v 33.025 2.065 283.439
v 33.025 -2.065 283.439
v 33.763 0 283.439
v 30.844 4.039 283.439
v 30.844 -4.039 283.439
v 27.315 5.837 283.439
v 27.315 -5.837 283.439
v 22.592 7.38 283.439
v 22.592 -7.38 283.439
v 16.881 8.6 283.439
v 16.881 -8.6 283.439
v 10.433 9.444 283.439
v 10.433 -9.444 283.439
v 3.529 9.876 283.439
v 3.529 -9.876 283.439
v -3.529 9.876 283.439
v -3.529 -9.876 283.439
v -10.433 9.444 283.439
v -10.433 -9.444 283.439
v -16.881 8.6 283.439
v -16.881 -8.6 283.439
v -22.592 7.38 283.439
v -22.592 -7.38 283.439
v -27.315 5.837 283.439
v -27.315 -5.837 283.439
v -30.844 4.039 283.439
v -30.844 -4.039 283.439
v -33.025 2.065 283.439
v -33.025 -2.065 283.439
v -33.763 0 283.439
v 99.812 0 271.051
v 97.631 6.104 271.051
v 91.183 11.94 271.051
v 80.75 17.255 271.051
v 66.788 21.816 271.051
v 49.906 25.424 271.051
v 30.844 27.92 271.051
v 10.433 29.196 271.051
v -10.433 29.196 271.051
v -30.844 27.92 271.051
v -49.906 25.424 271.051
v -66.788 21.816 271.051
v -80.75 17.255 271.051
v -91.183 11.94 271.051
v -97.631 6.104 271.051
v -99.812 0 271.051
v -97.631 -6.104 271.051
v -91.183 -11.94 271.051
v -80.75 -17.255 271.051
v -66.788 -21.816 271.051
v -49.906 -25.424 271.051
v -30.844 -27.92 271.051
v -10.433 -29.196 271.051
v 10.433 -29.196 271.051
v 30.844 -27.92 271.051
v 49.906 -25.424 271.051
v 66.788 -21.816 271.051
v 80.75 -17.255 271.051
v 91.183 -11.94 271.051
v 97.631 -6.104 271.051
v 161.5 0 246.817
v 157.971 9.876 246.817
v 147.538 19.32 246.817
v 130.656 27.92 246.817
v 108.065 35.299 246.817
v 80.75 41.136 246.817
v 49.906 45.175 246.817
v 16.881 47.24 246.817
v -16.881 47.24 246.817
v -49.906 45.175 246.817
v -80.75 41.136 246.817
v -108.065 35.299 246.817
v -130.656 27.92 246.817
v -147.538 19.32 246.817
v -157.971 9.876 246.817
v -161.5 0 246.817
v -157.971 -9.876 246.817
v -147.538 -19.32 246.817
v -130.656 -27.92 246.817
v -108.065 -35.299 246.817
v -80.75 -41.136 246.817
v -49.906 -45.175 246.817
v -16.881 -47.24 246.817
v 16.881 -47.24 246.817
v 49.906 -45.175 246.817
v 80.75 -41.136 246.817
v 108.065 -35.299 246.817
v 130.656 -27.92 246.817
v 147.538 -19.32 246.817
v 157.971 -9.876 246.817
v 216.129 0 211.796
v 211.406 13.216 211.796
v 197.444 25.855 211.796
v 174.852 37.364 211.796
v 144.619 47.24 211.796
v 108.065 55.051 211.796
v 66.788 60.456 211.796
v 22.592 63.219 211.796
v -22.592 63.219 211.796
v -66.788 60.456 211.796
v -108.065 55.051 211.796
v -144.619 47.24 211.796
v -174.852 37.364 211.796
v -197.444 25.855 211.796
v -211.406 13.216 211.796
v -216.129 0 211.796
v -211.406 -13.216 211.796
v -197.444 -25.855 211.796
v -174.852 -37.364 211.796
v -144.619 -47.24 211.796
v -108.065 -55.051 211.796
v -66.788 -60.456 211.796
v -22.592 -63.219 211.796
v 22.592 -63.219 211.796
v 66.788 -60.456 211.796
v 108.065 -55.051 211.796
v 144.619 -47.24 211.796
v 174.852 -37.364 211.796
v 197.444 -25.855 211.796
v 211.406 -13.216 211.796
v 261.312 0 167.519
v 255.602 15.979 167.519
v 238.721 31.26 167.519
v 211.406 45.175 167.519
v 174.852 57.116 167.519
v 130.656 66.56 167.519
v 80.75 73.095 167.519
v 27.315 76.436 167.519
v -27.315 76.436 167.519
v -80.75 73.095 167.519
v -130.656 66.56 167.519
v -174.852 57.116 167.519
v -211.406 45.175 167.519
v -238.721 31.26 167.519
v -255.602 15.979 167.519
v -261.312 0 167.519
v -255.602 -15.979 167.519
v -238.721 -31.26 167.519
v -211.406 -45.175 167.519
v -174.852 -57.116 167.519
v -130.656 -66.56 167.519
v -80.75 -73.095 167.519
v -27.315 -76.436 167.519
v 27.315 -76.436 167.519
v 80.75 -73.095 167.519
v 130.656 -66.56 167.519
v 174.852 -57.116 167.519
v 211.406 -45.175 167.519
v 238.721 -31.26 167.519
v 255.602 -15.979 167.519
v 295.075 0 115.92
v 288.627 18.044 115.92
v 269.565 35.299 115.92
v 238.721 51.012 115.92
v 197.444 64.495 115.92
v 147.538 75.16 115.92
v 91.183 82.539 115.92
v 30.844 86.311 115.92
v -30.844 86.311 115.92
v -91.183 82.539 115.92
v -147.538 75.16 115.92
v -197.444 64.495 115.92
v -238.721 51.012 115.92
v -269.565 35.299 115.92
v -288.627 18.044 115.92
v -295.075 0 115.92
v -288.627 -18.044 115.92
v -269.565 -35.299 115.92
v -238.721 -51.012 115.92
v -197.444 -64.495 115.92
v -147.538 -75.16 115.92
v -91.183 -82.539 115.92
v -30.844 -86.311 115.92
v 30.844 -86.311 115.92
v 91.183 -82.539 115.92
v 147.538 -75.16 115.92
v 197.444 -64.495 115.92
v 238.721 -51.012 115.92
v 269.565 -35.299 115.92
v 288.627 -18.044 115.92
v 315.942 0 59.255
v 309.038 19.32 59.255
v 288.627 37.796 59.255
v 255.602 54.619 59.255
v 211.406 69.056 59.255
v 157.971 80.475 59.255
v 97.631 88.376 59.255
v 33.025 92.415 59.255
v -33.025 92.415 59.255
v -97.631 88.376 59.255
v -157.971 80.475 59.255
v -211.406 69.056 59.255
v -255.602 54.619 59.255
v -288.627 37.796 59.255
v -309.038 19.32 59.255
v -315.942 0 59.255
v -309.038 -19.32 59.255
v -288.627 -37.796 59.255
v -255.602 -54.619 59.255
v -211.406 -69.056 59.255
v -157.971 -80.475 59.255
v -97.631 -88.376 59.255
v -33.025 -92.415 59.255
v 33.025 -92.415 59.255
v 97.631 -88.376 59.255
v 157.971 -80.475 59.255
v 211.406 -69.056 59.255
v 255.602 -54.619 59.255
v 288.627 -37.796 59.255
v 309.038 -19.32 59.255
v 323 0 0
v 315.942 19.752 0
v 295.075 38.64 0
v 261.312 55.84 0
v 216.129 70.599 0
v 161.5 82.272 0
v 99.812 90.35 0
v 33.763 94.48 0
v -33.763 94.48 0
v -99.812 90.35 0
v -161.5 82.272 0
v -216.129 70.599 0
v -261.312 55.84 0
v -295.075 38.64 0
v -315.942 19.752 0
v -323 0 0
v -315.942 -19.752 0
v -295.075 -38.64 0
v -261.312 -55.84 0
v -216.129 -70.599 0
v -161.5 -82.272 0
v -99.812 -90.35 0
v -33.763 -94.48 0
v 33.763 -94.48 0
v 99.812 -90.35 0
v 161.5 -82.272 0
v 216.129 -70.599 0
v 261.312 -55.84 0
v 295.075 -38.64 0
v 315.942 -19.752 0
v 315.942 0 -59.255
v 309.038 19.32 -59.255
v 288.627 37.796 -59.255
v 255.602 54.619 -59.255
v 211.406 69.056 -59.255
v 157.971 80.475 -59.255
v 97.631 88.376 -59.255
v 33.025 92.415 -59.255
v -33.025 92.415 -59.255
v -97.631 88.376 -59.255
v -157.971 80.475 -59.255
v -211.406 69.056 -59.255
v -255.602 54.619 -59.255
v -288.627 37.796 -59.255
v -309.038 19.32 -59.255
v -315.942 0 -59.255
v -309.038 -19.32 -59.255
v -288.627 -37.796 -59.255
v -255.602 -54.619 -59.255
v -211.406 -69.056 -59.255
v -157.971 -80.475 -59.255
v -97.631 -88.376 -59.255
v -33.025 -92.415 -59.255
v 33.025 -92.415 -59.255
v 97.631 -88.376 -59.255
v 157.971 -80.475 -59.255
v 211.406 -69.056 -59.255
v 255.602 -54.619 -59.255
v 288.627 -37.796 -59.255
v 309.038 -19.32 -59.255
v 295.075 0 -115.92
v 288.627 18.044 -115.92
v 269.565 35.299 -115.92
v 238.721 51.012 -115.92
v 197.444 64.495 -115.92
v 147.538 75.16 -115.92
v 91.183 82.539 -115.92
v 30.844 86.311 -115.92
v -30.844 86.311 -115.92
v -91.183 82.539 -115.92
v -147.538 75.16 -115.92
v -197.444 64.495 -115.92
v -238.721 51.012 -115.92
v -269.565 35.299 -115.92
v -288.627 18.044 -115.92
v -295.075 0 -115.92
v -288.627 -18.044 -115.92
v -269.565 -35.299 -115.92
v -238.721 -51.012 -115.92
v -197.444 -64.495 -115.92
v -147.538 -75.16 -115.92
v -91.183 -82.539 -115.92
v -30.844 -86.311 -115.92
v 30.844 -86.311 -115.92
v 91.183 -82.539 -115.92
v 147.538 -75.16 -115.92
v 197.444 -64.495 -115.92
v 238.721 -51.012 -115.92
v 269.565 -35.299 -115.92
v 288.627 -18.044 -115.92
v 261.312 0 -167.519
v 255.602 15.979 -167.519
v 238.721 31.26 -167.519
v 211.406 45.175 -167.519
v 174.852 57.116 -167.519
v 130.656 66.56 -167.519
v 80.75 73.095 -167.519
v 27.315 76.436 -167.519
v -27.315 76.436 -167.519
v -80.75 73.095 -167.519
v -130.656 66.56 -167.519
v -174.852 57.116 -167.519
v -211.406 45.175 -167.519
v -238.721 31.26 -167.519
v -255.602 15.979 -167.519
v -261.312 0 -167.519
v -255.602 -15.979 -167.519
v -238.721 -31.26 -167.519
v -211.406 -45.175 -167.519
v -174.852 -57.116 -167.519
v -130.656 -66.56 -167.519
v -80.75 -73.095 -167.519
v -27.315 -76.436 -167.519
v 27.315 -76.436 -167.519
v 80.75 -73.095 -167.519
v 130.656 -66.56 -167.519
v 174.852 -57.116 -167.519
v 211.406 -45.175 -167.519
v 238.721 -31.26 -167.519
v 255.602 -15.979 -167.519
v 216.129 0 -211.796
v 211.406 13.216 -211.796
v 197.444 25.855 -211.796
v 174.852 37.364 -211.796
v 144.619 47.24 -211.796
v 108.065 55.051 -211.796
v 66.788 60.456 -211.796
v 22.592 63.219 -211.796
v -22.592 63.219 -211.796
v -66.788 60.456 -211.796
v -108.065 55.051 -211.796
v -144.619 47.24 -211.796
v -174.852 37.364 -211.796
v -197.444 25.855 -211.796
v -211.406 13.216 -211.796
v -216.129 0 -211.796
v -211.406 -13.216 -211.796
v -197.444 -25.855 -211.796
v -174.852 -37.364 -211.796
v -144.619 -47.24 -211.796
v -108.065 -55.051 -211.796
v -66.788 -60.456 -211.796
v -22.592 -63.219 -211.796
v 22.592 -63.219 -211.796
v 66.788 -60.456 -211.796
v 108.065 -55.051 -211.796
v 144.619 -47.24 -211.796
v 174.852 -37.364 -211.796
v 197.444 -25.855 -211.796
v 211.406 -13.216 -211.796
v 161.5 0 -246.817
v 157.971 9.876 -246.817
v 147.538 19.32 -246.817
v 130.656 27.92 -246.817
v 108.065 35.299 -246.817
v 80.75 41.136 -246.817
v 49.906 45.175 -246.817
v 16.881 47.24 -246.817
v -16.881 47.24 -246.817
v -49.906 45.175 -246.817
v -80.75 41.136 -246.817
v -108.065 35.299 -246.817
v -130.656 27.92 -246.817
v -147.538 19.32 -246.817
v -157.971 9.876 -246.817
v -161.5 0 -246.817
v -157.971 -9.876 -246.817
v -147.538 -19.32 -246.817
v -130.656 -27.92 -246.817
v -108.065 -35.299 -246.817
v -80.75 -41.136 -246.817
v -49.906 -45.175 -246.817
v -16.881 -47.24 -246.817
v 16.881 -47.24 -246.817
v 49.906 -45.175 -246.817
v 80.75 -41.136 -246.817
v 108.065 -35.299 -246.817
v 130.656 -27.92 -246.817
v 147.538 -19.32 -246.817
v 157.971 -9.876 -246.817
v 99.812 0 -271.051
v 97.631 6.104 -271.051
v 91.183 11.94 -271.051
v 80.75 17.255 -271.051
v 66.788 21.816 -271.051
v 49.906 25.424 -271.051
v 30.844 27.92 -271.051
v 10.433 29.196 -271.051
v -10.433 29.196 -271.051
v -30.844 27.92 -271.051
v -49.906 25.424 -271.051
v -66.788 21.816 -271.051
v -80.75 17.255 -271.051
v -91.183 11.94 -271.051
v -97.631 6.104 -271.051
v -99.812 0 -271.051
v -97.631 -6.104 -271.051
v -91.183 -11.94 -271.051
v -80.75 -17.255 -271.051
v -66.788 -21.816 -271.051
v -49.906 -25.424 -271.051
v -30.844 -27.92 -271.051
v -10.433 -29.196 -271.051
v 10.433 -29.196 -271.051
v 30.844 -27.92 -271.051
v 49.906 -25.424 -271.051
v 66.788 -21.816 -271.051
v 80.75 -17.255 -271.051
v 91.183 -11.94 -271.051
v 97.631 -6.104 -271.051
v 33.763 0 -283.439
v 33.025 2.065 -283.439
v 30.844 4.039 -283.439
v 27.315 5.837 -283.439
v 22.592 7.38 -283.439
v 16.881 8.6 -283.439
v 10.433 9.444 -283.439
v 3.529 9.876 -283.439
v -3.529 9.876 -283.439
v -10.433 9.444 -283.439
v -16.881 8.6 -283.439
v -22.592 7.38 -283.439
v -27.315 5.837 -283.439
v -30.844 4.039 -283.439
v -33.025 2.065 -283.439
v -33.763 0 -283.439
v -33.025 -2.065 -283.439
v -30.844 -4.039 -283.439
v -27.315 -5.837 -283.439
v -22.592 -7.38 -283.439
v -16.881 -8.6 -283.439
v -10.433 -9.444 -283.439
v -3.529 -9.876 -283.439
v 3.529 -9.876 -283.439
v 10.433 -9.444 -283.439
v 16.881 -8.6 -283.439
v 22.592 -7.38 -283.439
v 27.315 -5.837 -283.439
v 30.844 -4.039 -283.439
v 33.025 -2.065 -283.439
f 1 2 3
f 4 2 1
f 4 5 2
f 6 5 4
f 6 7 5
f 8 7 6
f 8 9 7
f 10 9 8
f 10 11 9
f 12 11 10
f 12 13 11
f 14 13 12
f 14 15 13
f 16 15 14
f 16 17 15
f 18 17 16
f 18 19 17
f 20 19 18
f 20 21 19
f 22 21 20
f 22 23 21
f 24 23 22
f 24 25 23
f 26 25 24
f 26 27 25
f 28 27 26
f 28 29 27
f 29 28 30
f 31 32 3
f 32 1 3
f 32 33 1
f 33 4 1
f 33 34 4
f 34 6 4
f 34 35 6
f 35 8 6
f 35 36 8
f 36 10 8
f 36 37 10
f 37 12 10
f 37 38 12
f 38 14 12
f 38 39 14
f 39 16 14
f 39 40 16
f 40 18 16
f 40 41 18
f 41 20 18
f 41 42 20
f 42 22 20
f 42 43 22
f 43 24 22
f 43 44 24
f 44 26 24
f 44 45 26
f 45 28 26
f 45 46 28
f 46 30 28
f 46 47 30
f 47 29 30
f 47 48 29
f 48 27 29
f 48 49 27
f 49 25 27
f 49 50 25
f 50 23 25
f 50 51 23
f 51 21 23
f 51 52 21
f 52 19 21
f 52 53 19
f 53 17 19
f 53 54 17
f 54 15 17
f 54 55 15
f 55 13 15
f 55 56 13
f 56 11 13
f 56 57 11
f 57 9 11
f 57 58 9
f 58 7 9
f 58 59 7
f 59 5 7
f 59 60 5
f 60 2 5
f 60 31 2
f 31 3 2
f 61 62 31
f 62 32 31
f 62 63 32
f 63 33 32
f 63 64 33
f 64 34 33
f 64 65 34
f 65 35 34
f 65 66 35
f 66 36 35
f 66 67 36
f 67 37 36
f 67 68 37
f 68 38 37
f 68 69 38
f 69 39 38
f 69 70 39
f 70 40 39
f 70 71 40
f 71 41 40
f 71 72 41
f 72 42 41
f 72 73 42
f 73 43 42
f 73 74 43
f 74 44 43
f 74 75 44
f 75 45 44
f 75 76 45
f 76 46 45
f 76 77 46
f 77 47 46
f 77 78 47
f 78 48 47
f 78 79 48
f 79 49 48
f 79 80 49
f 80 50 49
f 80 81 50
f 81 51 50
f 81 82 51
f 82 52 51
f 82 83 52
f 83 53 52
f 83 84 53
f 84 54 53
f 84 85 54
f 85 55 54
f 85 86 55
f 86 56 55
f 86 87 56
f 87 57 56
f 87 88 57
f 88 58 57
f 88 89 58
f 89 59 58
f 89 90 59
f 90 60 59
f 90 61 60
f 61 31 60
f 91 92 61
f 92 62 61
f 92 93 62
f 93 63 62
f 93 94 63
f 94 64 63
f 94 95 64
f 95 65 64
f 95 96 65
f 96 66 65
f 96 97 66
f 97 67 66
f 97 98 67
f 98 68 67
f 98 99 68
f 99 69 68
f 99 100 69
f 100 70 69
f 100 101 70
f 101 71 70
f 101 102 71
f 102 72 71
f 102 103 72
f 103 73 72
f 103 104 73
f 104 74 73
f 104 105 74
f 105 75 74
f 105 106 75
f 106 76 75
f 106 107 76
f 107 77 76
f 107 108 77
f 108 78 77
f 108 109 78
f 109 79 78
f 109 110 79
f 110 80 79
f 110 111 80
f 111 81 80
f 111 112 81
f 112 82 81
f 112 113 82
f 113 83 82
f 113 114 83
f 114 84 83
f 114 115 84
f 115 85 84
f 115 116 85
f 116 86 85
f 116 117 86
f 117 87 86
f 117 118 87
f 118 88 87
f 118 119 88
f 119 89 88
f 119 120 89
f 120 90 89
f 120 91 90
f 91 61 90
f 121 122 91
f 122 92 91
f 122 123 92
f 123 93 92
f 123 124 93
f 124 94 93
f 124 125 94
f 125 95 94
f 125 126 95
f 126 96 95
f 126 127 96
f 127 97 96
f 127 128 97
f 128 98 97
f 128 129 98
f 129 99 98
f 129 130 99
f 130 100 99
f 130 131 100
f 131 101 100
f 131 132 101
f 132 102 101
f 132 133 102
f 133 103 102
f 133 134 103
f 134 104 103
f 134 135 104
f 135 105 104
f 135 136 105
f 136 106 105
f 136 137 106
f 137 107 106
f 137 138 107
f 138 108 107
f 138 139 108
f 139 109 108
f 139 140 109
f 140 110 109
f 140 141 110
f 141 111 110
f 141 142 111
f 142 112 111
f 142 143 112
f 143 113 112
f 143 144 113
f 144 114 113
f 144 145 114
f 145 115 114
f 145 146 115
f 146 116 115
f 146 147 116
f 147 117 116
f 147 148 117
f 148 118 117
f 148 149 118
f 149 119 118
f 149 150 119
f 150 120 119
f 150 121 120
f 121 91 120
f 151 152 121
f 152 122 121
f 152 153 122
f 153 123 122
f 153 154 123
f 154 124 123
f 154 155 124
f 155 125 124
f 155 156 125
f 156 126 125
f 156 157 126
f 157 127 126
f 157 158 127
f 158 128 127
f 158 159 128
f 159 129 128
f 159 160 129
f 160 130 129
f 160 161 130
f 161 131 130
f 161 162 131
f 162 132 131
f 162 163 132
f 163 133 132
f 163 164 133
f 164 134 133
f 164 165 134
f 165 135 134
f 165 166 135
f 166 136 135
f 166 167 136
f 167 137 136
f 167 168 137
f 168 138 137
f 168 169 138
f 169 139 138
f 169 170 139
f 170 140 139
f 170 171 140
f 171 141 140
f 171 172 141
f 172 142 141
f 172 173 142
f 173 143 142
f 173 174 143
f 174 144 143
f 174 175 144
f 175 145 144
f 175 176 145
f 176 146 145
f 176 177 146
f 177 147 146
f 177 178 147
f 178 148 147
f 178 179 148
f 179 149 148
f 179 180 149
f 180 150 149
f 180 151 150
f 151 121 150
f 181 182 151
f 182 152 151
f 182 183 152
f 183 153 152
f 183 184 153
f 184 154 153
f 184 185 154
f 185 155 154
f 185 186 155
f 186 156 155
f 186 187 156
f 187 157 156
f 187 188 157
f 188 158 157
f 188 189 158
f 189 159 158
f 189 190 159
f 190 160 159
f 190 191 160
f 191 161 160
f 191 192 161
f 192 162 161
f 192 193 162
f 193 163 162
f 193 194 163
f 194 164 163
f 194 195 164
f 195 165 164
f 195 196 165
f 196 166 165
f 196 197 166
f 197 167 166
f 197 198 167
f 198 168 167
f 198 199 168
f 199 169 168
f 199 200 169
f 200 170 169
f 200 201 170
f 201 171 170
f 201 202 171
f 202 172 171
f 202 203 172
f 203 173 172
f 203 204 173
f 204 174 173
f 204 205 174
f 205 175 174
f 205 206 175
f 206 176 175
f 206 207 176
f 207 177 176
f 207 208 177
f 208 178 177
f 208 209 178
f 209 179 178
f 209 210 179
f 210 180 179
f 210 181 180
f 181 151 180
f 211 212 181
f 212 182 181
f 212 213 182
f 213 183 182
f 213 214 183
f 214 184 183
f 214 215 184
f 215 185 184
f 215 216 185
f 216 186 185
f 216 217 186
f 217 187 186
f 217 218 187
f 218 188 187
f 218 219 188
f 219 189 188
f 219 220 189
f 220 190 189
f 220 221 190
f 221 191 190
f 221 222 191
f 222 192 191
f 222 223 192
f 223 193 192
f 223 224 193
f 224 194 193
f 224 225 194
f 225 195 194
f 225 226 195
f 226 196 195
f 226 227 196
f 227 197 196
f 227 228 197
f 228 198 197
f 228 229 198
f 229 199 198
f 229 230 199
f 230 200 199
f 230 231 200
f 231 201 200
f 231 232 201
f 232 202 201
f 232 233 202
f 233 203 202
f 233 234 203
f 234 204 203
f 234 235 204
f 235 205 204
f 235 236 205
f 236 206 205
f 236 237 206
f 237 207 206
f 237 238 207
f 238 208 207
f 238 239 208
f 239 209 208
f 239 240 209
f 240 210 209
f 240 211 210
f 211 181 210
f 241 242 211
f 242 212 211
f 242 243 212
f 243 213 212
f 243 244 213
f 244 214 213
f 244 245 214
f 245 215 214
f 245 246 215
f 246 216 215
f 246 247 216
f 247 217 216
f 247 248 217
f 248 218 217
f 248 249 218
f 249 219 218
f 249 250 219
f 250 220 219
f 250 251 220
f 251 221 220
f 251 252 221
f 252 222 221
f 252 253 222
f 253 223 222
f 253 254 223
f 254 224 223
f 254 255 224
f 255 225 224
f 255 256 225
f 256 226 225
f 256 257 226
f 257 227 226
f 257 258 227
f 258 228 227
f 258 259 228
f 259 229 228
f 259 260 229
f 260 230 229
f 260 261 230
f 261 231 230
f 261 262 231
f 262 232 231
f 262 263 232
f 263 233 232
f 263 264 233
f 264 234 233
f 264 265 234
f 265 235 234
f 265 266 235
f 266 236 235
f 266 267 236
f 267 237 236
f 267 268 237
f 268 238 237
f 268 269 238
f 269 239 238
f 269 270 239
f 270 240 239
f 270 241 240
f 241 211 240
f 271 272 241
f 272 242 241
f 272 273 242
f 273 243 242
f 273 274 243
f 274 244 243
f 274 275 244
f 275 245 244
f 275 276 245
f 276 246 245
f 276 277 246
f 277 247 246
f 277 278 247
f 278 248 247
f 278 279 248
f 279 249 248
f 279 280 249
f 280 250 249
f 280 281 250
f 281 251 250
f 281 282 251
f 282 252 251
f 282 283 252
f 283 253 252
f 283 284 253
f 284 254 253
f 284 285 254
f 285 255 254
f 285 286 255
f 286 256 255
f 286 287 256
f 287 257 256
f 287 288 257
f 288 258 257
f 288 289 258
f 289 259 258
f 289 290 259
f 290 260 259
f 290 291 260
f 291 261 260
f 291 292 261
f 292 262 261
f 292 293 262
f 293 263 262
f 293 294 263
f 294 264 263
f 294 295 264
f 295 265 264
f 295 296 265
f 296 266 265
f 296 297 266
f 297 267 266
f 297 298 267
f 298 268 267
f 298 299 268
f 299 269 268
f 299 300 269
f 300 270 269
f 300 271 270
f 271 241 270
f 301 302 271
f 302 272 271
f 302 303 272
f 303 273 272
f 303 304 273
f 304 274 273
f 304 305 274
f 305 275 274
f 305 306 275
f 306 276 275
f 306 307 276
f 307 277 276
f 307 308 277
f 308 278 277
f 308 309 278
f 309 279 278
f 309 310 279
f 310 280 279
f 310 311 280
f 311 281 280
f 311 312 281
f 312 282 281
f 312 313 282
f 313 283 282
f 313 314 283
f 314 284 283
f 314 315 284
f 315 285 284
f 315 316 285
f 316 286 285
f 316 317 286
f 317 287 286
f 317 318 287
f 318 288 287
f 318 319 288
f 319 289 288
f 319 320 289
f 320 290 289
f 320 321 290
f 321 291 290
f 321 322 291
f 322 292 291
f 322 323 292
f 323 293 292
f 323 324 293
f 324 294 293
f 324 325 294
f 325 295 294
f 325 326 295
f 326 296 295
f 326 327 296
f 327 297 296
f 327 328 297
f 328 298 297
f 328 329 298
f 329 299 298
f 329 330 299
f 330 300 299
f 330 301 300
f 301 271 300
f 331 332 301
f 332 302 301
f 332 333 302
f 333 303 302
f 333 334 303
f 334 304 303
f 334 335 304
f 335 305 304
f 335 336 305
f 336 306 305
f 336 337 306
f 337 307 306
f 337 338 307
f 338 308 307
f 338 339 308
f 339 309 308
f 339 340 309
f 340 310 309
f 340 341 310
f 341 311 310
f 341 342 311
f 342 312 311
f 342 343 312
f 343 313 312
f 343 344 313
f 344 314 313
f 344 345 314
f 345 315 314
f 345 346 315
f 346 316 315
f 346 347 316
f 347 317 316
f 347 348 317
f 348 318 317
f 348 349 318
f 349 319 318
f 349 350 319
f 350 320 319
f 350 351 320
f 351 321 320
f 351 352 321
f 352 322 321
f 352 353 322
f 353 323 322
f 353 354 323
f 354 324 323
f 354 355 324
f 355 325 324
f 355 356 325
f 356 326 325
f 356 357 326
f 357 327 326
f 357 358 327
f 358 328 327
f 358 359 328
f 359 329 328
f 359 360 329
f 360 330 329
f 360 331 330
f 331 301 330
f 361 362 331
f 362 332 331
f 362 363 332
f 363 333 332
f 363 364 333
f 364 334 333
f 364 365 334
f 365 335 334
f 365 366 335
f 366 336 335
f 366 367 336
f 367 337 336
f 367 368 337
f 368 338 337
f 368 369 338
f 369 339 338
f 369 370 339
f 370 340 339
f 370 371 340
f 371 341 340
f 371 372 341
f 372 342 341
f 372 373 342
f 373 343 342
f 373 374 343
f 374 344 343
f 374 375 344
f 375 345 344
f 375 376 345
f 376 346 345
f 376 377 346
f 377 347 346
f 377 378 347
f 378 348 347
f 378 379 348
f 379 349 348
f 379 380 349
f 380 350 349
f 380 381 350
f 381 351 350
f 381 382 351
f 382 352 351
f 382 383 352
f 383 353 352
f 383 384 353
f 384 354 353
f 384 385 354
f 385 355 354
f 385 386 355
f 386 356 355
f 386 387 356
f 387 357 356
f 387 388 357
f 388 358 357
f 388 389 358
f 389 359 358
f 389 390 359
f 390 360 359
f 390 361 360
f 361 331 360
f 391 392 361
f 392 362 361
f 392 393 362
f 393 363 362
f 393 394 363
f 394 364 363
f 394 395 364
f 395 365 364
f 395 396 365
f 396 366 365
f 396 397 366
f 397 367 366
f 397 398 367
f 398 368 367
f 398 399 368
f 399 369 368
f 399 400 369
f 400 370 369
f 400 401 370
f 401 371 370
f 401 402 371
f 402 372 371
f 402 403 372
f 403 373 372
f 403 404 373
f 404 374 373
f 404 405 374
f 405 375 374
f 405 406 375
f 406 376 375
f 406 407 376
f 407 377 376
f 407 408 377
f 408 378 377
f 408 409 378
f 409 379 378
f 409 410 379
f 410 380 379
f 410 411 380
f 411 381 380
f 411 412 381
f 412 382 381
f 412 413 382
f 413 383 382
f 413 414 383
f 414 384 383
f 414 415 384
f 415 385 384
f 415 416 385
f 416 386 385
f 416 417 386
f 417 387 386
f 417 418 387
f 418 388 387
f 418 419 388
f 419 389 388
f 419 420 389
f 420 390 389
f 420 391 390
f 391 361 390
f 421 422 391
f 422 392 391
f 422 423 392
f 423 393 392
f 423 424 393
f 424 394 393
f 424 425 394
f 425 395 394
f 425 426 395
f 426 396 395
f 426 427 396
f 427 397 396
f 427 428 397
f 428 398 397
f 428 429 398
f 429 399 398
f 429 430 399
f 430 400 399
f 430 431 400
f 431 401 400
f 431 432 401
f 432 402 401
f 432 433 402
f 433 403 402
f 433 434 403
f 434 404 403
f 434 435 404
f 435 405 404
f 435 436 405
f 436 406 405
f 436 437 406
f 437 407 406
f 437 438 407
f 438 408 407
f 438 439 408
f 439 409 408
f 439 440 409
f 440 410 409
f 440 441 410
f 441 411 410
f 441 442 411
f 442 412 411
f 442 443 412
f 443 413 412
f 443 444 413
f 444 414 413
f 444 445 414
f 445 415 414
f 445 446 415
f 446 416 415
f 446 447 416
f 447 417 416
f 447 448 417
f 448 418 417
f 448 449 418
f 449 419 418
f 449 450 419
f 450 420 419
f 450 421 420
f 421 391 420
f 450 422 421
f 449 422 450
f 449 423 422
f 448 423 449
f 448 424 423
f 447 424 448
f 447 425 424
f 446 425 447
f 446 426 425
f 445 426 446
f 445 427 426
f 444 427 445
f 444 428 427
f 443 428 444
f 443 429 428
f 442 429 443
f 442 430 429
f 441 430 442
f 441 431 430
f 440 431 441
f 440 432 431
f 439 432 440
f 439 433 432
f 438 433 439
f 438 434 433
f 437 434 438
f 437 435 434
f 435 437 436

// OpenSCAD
// Generated by SolidPython 1.0.1 on 2020-07-29 00:46:52


scale(v = [17, 5, 15]) {
	sphere(r = 19);
}
/***********************************************
*********      SolidPython code:      **********
************************************************
 
# import packages: SolidPython
from solid import *
from solid.utils import *
from itertools import chain, combinations, permutations


class Resize:

    def __init__(self, scad_file):
        self.scad_file = scad_file
        #self.scad_file = import_scad(scad_file)
        # cone/cylinder param:
        self.r1 = 0
        self.r2 = 0
        self.h = 0
        # rectangular prism param:
        self.w = 0
        self.l = 0
        # ellipse param:
        self.r = 0

    # import OpenScad code (file name corresponds to shape)


    # classify shape + parameters
    def assign(self, param1, param2, param3):
        if self.scad_file == 'cone.scad':
            self.r1 = param1
            self.r2 = param2
            self.h = param3
        elif self.scad_file == 'cylinder.scad':
            self.r1 = param1
            self.r2 = param2
            self.h = param3
        elif self.scad_file == 'rectangularPrism.scad':
            self.h = param1
            self.l = param2
            self.w = param3
        else:
            self.r = param1
            self.h = param2

    # resize parameters
    def iterate(self):
        x = range(3, 20, 2)
        i = 1
        if self.scad_file == 'cone.scad':
            tempList = list(permutations(x, 2))
            for temp in tempList:
                param1 = temp[0]
                param2 = temp[1]
                filepath = 'produced_scad_files/' + 'cone' + str(param1) + '_' + str(param2) + '_' + '.scad'
                scad_render_to_file(cylinder(h=param1, r1=param2, r2=0), filepath)

        elif self.scad_file == 'cylinder.scad':
            tempList = list(permutations(x, 3))
            for temp in tempList:
                param1 = temp[0]
                param2 = temp[1]
                filepath = 'produced_scad_files/' + 'cylinder' + str(param1) + '_' + str(param2) + '_' + '.scad'
                scad_render_to_file(cylinder(h=param1, r1=param2, r2=param2), filepath)

        elif self.scad_file == 'rectangularPrism.scad':
            tempList = list(permutations(x, 3))
            for temp in tempList:
                param1 = temp[0]
                param2 = temp[1]
                param3 = temp[2]
                filepath = 'produced_scad_files/' + 'rectangularPrism' + str(param1) + '_' + str(param2) + '_' + str(
                    param3) + '.scad'
                scad_render_to_file(cube(size=(param1, param2, param3)), filepath)

        elif self.scad_file == 'ellipse.scad':
            tempList = list(permutations(x, 4))
            for temp in tempList:
                param1 = temp[0]
                param2 = temp[1]
                param3 = temp[2]
                param4 = temp[3]
                filepath = 'produced_scad_files/' + 'ellipse' + str(param1) + '_' + str(param2) + '_' + str(param3) + '_' + str(param4) + '.scad'
                scad_render_to_file(scale([param1, param2, param3])(sphere(r=param4)), filepath)

    def render_to_scadfile(self):
        scad_render_to_file(scad, 'example.scad') 
 
************************************************/
